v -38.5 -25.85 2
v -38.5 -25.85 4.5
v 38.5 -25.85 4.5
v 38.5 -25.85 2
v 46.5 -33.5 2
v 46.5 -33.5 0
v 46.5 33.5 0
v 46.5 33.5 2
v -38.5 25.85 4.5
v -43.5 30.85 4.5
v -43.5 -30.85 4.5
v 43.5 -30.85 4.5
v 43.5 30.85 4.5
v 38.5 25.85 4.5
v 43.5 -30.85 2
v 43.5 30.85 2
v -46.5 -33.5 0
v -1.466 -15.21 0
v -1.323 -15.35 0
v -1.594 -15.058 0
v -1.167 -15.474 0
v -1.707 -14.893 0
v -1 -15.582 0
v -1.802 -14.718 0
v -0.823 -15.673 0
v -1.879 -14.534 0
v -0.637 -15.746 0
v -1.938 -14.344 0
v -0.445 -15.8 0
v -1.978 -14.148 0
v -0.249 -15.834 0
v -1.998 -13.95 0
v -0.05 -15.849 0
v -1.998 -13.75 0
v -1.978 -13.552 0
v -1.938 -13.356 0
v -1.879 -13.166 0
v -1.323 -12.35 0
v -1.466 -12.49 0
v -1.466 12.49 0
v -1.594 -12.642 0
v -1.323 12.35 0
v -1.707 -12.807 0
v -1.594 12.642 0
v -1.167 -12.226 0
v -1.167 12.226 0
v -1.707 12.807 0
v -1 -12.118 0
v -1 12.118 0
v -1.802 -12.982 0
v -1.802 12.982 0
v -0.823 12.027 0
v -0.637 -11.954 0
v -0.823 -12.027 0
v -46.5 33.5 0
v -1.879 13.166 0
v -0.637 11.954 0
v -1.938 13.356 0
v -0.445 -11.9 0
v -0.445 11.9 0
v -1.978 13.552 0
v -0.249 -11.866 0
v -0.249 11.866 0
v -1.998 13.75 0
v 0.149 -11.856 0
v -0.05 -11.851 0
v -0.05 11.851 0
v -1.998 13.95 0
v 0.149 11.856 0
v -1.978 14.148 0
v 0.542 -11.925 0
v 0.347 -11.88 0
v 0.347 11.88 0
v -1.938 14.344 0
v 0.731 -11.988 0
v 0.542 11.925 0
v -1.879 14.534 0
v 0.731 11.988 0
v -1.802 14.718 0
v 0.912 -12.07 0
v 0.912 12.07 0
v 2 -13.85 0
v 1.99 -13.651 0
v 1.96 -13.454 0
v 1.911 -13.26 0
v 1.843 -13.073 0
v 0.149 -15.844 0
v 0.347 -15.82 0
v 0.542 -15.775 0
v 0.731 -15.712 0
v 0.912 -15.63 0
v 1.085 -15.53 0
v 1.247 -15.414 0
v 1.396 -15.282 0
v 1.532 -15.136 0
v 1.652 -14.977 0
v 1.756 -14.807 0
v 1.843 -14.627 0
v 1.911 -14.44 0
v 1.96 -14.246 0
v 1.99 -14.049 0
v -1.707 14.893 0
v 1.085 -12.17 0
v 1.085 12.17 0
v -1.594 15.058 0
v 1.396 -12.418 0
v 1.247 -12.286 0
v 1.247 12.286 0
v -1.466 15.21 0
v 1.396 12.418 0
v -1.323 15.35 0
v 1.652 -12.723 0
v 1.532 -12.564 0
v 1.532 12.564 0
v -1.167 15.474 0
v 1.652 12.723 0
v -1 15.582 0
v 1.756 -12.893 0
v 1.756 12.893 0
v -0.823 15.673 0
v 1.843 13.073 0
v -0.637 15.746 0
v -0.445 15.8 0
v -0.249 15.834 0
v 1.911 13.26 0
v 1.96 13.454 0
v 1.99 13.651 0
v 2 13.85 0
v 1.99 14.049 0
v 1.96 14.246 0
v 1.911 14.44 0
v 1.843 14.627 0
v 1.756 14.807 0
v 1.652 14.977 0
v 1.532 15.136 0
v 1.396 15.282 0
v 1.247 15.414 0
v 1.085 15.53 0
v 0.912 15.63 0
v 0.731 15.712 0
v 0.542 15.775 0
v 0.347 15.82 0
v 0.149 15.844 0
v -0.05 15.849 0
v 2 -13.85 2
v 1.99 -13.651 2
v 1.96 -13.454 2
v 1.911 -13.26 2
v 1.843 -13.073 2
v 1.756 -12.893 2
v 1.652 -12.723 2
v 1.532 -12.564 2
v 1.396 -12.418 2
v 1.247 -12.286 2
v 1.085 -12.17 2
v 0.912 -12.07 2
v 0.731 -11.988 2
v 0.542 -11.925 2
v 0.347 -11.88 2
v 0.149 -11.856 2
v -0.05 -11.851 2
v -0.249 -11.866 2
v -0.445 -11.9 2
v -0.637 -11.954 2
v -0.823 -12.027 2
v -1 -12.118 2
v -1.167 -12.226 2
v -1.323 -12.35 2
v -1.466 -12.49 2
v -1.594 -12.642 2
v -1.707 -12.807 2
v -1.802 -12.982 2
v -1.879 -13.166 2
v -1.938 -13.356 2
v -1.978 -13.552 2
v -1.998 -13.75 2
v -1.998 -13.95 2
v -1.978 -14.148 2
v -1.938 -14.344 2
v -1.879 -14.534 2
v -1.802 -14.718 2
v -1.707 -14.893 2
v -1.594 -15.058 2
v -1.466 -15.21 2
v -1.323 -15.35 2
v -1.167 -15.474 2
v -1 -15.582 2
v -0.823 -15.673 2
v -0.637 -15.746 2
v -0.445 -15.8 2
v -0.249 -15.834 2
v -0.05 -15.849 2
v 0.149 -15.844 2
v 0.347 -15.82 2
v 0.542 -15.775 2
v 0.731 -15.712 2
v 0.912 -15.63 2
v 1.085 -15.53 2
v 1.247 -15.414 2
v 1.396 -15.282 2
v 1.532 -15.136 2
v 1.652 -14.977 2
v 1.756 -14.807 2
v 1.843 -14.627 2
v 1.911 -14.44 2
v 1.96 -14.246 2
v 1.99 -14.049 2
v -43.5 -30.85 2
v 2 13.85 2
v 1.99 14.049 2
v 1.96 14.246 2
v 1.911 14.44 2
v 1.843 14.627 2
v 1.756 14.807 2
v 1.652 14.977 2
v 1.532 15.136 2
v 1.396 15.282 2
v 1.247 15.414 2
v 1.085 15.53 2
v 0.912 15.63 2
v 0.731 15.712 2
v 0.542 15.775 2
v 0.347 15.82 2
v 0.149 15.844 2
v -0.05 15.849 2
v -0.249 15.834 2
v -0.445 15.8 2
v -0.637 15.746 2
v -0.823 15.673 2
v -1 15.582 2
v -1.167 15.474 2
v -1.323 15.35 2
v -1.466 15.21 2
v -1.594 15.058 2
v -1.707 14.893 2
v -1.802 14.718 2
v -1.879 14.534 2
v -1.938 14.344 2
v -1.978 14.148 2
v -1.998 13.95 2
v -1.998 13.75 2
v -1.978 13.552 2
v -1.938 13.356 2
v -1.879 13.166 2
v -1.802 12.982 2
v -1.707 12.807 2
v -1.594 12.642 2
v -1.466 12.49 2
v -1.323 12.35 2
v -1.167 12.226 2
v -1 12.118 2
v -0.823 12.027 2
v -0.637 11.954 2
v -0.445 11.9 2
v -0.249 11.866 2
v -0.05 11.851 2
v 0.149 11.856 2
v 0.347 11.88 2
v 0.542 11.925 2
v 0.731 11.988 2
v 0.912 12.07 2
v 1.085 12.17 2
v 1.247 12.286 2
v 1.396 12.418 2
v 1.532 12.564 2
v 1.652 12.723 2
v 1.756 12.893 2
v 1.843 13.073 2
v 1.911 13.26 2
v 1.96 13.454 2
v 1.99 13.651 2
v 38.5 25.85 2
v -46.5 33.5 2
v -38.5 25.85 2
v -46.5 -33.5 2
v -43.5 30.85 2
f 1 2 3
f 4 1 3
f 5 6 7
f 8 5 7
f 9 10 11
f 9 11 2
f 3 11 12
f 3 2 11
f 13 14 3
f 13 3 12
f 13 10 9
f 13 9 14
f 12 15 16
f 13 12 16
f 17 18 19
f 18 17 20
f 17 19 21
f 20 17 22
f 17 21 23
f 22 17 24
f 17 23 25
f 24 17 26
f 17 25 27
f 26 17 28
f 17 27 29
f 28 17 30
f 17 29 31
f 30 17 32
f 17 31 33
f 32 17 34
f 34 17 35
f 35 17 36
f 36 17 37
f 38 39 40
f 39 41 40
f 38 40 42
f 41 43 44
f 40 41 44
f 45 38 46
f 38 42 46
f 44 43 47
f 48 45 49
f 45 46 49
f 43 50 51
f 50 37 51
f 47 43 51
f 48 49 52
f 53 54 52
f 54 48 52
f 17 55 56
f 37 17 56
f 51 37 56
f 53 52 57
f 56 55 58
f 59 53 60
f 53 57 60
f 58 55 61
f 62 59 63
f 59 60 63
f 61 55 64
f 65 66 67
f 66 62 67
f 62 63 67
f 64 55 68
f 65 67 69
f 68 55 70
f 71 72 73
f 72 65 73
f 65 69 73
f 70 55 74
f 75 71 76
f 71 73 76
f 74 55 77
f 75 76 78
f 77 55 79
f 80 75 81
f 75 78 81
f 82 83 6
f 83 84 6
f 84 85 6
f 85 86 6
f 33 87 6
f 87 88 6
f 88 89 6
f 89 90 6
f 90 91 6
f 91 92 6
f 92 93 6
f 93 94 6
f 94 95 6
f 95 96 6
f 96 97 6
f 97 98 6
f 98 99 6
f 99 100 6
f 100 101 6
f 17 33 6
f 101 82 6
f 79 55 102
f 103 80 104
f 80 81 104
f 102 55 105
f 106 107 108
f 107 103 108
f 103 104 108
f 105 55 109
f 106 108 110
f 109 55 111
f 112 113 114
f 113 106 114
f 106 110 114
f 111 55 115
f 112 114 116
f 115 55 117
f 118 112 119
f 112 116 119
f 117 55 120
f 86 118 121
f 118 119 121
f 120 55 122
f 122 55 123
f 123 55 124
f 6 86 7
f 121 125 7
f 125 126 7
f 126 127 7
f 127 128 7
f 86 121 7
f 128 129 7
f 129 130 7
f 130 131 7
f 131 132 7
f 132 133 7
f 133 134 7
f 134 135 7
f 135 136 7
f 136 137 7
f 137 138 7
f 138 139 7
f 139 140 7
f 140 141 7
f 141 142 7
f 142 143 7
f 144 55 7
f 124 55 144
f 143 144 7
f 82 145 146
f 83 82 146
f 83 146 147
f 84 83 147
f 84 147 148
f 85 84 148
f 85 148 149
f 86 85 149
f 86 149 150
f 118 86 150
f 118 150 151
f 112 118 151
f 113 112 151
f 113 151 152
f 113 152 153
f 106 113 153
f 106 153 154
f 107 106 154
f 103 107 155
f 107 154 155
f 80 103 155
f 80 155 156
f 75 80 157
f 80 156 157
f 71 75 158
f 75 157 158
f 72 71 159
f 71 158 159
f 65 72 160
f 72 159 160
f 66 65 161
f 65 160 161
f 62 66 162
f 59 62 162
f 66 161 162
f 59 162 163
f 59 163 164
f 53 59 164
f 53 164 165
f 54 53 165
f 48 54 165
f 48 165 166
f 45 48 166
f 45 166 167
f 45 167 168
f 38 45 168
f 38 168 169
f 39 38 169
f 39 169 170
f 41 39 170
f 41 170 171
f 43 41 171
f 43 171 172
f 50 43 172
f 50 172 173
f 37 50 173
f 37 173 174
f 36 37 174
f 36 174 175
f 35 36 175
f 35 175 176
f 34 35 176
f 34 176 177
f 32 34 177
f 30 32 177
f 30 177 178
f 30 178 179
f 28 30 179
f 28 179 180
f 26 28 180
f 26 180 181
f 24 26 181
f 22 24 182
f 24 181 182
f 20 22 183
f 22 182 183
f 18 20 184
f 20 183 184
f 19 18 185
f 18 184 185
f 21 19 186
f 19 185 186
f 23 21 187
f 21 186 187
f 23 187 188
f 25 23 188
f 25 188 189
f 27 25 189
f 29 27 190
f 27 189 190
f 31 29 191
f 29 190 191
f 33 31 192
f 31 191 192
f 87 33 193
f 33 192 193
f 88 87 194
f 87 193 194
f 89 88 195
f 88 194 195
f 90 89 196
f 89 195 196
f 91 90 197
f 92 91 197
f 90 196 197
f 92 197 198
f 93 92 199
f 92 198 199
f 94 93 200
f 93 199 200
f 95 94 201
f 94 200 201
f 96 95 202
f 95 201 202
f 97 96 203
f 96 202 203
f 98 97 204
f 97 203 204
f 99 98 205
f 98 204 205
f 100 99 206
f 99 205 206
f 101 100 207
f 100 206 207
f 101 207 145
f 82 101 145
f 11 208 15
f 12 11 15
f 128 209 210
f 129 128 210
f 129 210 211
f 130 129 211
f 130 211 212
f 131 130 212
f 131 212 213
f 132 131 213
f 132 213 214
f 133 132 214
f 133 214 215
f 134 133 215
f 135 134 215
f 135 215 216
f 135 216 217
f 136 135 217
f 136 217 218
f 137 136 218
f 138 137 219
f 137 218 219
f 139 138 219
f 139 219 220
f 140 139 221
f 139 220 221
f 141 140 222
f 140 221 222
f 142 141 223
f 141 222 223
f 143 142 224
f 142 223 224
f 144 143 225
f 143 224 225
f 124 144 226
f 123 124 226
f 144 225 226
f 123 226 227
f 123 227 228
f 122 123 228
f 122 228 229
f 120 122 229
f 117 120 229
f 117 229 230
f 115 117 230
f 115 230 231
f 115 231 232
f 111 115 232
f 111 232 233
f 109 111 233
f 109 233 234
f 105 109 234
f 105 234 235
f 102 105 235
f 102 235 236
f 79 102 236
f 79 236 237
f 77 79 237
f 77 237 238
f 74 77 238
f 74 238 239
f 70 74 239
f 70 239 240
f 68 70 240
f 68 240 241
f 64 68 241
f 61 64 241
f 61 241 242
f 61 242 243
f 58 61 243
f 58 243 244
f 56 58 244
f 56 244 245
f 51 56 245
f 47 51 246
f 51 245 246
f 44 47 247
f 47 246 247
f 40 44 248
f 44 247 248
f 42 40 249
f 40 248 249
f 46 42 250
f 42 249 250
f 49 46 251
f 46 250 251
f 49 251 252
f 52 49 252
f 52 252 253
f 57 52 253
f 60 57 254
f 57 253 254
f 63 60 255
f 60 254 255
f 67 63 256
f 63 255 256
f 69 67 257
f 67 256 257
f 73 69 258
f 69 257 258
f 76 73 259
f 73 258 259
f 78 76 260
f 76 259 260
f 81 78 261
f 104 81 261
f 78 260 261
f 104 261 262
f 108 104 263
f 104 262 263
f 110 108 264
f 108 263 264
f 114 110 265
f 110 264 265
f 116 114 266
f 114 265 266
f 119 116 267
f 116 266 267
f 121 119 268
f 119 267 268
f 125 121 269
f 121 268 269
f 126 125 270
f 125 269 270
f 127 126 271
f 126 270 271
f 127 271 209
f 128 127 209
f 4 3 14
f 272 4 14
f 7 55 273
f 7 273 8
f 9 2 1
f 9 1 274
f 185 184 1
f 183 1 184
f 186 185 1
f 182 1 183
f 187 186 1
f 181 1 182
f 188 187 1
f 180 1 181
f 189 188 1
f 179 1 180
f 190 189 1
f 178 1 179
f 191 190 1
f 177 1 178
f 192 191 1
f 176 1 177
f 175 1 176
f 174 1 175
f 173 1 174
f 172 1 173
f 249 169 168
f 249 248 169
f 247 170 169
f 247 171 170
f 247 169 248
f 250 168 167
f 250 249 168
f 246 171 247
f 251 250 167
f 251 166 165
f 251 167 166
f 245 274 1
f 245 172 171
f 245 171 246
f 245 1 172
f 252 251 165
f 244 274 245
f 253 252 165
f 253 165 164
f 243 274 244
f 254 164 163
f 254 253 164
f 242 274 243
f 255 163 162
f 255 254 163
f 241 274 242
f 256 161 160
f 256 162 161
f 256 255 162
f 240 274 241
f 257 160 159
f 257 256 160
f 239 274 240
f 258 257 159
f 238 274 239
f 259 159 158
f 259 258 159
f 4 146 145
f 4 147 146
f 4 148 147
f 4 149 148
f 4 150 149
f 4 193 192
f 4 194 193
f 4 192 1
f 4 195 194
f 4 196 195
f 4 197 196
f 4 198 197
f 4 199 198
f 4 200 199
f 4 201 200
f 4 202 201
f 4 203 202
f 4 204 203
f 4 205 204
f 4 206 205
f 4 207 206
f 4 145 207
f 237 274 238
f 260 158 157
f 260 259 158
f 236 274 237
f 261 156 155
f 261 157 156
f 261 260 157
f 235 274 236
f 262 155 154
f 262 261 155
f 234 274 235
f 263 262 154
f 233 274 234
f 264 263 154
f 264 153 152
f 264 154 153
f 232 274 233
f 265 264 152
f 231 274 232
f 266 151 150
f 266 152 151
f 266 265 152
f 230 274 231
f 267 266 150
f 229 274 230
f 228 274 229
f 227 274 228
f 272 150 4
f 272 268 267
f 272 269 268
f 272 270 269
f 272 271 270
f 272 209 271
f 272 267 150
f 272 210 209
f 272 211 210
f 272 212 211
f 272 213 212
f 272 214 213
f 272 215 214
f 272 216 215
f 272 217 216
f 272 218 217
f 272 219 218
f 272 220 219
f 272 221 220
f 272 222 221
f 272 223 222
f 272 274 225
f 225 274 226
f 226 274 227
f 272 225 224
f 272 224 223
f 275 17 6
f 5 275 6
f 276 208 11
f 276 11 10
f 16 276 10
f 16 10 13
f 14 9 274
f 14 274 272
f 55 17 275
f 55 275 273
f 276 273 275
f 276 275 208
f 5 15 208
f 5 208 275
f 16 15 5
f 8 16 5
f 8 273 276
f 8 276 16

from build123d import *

# Parameters (mm, degrees)
F0_W     = 93
F0_H     = 67
F1_DEPTH = 2
F2_W     = 87
F2_H     = 61.7
F3_DEPTH = 2.5
F4_R     = 2
F5_DEPTH = 4.501
F6_W     = 77
F6_H     = 51.7
F7_DEPTH = 2.5


with BuildPart() as f1:
    # F0 (on Top) → F1 (new body)
    with BuildSketch(Plane.XY):
        Rectangle(F0_W, F0_H)
    extrude(amount=F1_DEPTH)

    # F2 (on face) → F3 (join)
    with BuildSketch(Plane.XY.offset(2)):
        Rectangle(F2_W, F2_H)
    extrude(amount=F3_DEPTH)

    # F4 (on face) → F5 (cut, through all)
    with BuildSketch(Plane.XY.offset(4.5)):
        with Locations((0, 13.85)):
            Circle(F4_R)
        with Locations((0, -13.85)):
            Circle(F4_R)
    extrude(amount=-F5_DEPTH, mode=Mode.SUBTRACT)

    # F6 (on face) → F7 (cut)
    with BuildSketch(Plane.XY.offset(4.5)):
        Rectangle(F6_W, F6_H)
    extrude(amount=-F7_DEPTH, mode=Mode.SUBTRACT)


solid = f1.part
